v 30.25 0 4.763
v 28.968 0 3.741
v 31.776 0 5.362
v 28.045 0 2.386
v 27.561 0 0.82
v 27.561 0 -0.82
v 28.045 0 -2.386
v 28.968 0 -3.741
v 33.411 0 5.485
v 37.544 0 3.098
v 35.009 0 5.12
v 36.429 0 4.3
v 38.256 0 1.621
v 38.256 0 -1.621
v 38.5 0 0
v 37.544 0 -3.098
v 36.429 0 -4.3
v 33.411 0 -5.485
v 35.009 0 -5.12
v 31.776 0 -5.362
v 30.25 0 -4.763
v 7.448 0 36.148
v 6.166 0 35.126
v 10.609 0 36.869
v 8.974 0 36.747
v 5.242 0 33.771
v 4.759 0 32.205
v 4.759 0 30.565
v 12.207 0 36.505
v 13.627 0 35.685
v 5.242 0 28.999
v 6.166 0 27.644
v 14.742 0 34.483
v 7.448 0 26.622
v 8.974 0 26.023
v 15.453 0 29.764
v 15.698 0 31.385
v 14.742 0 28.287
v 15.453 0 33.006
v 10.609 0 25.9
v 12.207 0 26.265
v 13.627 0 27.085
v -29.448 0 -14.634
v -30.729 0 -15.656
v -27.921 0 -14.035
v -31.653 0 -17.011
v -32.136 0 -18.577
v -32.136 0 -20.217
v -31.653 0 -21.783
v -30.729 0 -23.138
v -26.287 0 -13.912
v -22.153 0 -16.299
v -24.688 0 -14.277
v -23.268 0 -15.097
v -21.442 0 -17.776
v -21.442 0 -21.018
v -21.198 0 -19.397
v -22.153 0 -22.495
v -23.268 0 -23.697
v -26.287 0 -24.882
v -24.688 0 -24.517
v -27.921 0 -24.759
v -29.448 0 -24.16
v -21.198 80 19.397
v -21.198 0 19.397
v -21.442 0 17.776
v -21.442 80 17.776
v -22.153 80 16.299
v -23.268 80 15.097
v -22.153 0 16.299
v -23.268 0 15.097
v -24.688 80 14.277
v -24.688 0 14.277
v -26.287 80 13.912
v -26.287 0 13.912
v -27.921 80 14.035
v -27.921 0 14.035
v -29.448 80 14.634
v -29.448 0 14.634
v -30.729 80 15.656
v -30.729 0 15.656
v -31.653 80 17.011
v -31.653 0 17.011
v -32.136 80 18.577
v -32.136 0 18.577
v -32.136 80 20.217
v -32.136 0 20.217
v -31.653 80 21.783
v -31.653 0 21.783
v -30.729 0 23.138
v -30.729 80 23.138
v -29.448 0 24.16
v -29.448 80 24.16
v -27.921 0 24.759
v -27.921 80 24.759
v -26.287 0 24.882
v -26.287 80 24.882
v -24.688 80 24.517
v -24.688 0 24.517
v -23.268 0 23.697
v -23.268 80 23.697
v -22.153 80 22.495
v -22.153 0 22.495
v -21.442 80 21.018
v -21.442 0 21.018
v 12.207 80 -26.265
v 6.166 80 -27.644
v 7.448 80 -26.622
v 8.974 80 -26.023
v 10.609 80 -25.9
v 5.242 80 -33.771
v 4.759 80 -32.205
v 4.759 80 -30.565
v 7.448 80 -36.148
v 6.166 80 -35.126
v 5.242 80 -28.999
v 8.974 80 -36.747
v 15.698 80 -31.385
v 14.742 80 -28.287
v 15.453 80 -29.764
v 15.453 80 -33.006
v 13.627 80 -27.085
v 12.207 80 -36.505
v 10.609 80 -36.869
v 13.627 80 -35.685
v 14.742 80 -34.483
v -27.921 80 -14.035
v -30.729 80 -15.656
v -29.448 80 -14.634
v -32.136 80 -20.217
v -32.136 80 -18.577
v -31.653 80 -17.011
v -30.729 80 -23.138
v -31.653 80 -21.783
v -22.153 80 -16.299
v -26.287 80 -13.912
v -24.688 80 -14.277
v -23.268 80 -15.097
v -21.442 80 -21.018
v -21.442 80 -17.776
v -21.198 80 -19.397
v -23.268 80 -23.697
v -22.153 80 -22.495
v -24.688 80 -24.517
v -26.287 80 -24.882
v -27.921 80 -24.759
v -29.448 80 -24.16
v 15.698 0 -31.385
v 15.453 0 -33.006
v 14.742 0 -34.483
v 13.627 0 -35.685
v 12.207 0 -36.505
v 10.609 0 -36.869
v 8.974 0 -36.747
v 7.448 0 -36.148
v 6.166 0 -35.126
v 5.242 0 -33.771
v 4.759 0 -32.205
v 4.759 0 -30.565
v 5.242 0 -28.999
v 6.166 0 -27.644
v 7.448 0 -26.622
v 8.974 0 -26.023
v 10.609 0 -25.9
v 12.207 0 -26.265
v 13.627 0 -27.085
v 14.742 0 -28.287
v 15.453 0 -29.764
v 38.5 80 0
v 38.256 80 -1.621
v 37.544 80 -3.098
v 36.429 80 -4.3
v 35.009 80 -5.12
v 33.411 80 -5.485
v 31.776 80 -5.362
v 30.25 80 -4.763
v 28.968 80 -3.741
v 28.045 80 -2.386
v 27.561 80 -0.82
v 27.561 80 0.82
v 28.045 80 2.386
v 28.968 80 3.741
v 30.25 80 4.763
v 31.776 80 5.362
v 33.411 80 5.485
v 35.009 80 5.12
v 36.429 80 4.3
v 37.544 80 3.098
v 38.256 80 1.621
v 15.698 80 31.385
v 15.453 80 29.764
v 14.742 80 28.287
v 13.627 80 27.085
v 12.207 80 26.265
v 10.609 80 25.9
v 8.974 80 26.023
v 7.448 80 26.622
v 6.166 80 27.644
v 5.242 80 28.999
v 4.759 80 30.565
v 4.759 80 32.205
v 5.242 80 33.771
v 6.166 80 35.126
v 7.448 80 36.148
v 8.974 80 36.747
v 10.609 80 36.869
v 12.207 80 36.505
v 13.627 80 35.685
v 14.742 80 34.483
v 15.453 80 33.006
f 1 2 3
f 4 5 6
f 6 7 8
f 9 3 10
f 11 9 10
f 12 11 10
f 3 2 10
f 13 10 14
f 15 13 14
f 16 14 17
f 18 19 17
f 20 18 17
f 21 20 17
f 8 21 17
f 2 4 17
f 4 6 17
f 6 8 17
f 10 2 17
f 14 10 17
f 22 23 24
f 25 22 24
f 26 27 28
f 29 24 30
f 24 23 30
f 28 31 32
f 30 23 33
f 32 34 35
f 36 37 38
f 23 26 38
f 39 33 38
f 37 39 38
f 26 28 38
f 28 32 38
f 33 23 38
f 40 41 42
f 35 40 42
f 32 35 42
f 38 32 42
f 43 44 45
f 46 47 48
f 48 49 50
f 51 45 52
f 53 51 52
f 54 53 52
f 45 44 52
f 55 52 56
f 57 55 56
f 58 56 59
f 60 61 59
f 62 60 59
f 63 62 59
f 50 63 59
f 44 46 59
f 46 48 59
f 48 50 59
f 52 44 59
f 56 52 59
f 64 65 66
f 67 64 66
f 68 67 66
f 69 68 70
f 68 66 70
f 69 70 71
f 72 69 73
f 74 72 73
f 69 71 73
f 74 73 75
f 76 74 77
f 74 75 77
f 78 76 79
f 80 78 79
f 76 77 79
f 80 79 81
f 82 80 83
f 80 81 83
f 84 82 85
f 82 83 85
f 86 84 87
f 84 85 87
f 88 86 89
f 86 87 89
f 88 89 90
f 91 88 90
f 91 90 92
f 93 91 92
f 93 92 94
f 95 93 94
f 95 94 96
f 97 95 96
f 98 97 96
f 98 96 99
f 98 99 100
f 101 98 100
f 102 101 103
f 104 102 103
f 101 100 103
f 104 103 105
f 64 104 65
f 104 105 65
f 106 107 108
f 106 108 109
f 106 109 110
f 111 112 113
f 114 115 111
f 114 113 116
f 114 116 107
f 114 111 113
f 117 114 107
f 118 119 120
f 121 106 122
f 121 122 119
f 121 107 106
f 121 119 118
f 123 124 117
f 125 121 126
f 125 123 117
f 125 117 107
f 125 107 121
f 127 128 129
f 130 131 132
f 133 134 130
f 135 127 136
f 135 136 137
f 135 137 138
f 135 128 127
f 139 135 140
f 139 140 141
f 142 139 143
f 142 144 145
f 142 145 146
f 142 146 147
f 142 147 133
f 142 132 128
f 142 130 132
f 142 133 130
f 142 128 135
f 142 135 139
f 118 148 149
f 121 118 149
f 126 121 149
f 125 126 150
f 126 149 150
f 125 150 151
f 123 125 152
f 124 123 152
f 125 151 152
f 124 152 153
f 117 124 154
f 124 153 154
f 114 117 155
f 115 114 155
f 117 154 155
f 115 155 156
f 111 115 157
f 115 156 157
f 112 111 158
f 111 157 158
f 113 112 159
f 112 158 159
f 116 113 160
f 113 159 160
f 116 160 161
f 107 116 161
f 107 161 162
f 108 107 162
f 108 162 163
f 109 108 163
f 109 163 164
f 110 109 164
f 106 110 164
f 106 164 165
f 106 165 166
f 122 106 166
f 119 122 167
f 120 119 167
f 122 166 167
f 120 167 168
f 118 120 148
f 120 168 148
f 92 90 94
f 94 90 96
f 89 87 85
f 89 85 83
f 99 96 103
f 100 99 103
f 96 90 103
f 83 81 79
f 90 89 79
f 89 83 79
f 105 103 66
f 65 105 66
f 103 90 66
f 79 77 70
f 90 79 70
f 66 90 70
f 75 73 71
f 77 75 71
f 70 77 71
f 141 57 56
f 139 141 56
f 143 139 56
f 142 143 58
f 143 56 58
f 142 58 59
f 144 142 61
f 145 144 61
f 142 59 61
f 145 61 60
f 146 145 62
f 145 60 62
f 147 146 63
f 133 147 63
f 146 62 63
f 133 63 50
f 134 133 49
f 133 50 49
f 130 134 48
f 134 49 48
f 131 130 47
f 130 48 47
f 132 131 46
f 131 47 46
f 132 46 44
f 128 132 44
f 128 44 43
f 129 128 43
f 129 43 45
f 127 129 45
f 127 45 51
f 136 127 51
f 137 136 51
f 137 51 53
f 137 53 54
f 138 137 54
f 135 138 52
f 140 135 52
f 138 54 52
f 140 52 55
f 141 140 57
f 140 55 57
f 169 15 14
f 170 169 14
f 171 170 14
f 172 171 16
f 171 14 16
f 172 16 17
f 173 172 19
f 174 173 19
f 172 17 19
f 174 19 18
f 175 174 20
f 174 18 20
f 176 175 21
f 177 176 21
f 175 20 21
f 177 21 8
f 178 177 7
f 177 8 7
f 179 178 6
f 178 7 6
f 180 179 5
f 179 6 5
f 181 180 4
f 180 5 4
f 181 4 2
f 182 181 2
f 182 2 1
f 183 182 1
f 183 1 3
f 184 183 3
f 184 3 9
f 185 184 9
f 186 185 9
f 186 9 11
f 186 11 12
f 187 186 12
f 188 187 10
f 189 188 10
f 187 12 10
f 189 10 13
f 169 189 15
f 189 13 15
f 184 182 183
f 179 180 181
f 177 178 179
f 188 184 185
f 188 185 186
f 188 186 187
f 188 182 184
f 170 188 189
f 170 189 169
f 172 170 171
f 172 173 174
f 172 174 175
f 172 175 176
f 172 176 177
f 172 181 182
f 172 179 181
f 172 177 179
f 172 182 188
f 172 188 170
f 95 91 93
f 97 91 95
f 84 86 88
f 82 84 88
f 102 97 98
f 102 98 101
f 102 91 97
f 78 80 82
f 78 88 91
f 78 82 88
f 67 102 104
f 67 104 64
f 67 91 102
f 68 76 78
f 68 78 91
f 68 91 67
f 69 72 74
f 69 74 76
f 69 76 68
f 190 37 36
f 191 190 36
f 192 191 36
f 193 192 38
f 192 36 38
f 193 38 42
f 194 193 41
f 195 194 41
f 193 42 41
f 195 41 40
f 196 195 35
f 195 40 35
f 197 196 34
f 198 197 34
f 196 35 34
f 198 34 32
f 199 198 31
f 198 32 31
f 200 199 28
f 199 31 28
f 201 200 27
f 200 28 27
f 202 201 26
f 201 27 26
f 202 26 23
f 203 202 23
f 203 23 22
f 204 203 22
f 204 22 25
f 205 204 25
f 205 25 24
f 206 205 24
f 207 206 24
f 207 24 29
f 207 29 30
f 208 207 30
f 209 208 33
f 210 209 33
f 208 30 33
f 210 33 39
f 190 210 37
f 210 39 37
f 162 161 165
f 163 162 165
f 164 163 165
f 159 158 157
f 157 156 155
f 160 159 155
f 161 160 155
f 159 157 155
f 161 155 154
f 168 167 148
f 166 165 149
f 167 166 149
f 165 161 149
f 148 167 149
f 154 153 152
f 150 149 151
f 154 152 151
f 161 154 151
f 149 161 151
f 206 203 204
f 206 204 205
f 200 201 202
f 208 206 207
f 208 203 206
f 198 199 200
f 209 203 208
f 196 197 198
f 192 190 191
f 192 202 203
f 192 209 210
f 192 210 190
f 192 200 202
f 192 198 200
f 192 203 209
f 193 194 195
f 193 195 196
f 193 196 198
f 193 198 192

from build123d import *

# Parameters (mm, degrees)
SKETCH1_R             = 5.5
BOSS_EXTRUDE1_DEPTH   = 80
BOSS_EXTRUDE1_2_DEPTH = 80
BOSS_EXTRUDE1_3_DEPTH = 80
BOSS_EXTRUDE1_4_DEPTH = 80
BOSS_EXTRUDE1_5_DEPTH = 80


with BuildPart() as part:
    # Sketch1 → Boss-Extrude1 (new body)
    with BuildSketch(Plane(origin=(0, 0, 0), x_dir=(1, 0, 0), z_dir=(0, 1, 0))):
        with Locations((33, 0)):
            Circle(SKETCH1_R)
    extrude(amount=BOSS_EXTRUDE1_DEPTH)


with BuildPart() as body_2:
    # Sketch1 → Boss-Extrude1 2 (new body)
    with BuildSketch(Plane(origin=(0, 0, 0), x_dir=(1, 0, 0), z_dir=(0, 1, 0))):
        with Locations((10.197560814, -31.384865038)):
            Circle(SKETCH1_R)
    extrude(amount=BOSS_EXTRUDE1_2_DEPTH)


with BuildPart() as body_3:
    # Sketch1 → Boss-Extrude1 3 (new body)
    with BuildSketch(Plane(origin=(0, 0, 0), x_dir=(1, 0, 0), z_dir=(0, 1, 0))):
        with Locations((-26.697560814, -19.396913326)):
            Circle(SKETCH1_R)
    extrude(amount=BOSS_EXTRUDE1_3_DEPTH)


with BuildPart() as body_4:
    # Sketch1 → Boss-Extrude1 4 (new body)
    with BuildSketch(Plane(origin=(0, 0, 0), x_dir=(1, 0, 0), z_dir=(0, 1, 0))):
        with Locations((-26.697560814, 19.396913326)):
            Circle(SKETCH1_R)
    extrude(amount=BOSS_EXTRUDE1_4_DEPTH)


with BuildPart() as body_5:
    # Sketch1 → Boss-Extrude1 5 (new body)
    with BuildSketch(Plane(origin=(0, 0, 0), x_dir=(1, 0, 0), z_dir=(0, 1, 0))):
        with Locations((10.197560814, 31.384865038)):
            Circle(SKETCH1_R)
    extrude(amount=BOSS_EXTRUDE1_5_DEPTH)


solid = Compound([part.part, body_2.part, body_3.part, body_4.part, body_5.part])
